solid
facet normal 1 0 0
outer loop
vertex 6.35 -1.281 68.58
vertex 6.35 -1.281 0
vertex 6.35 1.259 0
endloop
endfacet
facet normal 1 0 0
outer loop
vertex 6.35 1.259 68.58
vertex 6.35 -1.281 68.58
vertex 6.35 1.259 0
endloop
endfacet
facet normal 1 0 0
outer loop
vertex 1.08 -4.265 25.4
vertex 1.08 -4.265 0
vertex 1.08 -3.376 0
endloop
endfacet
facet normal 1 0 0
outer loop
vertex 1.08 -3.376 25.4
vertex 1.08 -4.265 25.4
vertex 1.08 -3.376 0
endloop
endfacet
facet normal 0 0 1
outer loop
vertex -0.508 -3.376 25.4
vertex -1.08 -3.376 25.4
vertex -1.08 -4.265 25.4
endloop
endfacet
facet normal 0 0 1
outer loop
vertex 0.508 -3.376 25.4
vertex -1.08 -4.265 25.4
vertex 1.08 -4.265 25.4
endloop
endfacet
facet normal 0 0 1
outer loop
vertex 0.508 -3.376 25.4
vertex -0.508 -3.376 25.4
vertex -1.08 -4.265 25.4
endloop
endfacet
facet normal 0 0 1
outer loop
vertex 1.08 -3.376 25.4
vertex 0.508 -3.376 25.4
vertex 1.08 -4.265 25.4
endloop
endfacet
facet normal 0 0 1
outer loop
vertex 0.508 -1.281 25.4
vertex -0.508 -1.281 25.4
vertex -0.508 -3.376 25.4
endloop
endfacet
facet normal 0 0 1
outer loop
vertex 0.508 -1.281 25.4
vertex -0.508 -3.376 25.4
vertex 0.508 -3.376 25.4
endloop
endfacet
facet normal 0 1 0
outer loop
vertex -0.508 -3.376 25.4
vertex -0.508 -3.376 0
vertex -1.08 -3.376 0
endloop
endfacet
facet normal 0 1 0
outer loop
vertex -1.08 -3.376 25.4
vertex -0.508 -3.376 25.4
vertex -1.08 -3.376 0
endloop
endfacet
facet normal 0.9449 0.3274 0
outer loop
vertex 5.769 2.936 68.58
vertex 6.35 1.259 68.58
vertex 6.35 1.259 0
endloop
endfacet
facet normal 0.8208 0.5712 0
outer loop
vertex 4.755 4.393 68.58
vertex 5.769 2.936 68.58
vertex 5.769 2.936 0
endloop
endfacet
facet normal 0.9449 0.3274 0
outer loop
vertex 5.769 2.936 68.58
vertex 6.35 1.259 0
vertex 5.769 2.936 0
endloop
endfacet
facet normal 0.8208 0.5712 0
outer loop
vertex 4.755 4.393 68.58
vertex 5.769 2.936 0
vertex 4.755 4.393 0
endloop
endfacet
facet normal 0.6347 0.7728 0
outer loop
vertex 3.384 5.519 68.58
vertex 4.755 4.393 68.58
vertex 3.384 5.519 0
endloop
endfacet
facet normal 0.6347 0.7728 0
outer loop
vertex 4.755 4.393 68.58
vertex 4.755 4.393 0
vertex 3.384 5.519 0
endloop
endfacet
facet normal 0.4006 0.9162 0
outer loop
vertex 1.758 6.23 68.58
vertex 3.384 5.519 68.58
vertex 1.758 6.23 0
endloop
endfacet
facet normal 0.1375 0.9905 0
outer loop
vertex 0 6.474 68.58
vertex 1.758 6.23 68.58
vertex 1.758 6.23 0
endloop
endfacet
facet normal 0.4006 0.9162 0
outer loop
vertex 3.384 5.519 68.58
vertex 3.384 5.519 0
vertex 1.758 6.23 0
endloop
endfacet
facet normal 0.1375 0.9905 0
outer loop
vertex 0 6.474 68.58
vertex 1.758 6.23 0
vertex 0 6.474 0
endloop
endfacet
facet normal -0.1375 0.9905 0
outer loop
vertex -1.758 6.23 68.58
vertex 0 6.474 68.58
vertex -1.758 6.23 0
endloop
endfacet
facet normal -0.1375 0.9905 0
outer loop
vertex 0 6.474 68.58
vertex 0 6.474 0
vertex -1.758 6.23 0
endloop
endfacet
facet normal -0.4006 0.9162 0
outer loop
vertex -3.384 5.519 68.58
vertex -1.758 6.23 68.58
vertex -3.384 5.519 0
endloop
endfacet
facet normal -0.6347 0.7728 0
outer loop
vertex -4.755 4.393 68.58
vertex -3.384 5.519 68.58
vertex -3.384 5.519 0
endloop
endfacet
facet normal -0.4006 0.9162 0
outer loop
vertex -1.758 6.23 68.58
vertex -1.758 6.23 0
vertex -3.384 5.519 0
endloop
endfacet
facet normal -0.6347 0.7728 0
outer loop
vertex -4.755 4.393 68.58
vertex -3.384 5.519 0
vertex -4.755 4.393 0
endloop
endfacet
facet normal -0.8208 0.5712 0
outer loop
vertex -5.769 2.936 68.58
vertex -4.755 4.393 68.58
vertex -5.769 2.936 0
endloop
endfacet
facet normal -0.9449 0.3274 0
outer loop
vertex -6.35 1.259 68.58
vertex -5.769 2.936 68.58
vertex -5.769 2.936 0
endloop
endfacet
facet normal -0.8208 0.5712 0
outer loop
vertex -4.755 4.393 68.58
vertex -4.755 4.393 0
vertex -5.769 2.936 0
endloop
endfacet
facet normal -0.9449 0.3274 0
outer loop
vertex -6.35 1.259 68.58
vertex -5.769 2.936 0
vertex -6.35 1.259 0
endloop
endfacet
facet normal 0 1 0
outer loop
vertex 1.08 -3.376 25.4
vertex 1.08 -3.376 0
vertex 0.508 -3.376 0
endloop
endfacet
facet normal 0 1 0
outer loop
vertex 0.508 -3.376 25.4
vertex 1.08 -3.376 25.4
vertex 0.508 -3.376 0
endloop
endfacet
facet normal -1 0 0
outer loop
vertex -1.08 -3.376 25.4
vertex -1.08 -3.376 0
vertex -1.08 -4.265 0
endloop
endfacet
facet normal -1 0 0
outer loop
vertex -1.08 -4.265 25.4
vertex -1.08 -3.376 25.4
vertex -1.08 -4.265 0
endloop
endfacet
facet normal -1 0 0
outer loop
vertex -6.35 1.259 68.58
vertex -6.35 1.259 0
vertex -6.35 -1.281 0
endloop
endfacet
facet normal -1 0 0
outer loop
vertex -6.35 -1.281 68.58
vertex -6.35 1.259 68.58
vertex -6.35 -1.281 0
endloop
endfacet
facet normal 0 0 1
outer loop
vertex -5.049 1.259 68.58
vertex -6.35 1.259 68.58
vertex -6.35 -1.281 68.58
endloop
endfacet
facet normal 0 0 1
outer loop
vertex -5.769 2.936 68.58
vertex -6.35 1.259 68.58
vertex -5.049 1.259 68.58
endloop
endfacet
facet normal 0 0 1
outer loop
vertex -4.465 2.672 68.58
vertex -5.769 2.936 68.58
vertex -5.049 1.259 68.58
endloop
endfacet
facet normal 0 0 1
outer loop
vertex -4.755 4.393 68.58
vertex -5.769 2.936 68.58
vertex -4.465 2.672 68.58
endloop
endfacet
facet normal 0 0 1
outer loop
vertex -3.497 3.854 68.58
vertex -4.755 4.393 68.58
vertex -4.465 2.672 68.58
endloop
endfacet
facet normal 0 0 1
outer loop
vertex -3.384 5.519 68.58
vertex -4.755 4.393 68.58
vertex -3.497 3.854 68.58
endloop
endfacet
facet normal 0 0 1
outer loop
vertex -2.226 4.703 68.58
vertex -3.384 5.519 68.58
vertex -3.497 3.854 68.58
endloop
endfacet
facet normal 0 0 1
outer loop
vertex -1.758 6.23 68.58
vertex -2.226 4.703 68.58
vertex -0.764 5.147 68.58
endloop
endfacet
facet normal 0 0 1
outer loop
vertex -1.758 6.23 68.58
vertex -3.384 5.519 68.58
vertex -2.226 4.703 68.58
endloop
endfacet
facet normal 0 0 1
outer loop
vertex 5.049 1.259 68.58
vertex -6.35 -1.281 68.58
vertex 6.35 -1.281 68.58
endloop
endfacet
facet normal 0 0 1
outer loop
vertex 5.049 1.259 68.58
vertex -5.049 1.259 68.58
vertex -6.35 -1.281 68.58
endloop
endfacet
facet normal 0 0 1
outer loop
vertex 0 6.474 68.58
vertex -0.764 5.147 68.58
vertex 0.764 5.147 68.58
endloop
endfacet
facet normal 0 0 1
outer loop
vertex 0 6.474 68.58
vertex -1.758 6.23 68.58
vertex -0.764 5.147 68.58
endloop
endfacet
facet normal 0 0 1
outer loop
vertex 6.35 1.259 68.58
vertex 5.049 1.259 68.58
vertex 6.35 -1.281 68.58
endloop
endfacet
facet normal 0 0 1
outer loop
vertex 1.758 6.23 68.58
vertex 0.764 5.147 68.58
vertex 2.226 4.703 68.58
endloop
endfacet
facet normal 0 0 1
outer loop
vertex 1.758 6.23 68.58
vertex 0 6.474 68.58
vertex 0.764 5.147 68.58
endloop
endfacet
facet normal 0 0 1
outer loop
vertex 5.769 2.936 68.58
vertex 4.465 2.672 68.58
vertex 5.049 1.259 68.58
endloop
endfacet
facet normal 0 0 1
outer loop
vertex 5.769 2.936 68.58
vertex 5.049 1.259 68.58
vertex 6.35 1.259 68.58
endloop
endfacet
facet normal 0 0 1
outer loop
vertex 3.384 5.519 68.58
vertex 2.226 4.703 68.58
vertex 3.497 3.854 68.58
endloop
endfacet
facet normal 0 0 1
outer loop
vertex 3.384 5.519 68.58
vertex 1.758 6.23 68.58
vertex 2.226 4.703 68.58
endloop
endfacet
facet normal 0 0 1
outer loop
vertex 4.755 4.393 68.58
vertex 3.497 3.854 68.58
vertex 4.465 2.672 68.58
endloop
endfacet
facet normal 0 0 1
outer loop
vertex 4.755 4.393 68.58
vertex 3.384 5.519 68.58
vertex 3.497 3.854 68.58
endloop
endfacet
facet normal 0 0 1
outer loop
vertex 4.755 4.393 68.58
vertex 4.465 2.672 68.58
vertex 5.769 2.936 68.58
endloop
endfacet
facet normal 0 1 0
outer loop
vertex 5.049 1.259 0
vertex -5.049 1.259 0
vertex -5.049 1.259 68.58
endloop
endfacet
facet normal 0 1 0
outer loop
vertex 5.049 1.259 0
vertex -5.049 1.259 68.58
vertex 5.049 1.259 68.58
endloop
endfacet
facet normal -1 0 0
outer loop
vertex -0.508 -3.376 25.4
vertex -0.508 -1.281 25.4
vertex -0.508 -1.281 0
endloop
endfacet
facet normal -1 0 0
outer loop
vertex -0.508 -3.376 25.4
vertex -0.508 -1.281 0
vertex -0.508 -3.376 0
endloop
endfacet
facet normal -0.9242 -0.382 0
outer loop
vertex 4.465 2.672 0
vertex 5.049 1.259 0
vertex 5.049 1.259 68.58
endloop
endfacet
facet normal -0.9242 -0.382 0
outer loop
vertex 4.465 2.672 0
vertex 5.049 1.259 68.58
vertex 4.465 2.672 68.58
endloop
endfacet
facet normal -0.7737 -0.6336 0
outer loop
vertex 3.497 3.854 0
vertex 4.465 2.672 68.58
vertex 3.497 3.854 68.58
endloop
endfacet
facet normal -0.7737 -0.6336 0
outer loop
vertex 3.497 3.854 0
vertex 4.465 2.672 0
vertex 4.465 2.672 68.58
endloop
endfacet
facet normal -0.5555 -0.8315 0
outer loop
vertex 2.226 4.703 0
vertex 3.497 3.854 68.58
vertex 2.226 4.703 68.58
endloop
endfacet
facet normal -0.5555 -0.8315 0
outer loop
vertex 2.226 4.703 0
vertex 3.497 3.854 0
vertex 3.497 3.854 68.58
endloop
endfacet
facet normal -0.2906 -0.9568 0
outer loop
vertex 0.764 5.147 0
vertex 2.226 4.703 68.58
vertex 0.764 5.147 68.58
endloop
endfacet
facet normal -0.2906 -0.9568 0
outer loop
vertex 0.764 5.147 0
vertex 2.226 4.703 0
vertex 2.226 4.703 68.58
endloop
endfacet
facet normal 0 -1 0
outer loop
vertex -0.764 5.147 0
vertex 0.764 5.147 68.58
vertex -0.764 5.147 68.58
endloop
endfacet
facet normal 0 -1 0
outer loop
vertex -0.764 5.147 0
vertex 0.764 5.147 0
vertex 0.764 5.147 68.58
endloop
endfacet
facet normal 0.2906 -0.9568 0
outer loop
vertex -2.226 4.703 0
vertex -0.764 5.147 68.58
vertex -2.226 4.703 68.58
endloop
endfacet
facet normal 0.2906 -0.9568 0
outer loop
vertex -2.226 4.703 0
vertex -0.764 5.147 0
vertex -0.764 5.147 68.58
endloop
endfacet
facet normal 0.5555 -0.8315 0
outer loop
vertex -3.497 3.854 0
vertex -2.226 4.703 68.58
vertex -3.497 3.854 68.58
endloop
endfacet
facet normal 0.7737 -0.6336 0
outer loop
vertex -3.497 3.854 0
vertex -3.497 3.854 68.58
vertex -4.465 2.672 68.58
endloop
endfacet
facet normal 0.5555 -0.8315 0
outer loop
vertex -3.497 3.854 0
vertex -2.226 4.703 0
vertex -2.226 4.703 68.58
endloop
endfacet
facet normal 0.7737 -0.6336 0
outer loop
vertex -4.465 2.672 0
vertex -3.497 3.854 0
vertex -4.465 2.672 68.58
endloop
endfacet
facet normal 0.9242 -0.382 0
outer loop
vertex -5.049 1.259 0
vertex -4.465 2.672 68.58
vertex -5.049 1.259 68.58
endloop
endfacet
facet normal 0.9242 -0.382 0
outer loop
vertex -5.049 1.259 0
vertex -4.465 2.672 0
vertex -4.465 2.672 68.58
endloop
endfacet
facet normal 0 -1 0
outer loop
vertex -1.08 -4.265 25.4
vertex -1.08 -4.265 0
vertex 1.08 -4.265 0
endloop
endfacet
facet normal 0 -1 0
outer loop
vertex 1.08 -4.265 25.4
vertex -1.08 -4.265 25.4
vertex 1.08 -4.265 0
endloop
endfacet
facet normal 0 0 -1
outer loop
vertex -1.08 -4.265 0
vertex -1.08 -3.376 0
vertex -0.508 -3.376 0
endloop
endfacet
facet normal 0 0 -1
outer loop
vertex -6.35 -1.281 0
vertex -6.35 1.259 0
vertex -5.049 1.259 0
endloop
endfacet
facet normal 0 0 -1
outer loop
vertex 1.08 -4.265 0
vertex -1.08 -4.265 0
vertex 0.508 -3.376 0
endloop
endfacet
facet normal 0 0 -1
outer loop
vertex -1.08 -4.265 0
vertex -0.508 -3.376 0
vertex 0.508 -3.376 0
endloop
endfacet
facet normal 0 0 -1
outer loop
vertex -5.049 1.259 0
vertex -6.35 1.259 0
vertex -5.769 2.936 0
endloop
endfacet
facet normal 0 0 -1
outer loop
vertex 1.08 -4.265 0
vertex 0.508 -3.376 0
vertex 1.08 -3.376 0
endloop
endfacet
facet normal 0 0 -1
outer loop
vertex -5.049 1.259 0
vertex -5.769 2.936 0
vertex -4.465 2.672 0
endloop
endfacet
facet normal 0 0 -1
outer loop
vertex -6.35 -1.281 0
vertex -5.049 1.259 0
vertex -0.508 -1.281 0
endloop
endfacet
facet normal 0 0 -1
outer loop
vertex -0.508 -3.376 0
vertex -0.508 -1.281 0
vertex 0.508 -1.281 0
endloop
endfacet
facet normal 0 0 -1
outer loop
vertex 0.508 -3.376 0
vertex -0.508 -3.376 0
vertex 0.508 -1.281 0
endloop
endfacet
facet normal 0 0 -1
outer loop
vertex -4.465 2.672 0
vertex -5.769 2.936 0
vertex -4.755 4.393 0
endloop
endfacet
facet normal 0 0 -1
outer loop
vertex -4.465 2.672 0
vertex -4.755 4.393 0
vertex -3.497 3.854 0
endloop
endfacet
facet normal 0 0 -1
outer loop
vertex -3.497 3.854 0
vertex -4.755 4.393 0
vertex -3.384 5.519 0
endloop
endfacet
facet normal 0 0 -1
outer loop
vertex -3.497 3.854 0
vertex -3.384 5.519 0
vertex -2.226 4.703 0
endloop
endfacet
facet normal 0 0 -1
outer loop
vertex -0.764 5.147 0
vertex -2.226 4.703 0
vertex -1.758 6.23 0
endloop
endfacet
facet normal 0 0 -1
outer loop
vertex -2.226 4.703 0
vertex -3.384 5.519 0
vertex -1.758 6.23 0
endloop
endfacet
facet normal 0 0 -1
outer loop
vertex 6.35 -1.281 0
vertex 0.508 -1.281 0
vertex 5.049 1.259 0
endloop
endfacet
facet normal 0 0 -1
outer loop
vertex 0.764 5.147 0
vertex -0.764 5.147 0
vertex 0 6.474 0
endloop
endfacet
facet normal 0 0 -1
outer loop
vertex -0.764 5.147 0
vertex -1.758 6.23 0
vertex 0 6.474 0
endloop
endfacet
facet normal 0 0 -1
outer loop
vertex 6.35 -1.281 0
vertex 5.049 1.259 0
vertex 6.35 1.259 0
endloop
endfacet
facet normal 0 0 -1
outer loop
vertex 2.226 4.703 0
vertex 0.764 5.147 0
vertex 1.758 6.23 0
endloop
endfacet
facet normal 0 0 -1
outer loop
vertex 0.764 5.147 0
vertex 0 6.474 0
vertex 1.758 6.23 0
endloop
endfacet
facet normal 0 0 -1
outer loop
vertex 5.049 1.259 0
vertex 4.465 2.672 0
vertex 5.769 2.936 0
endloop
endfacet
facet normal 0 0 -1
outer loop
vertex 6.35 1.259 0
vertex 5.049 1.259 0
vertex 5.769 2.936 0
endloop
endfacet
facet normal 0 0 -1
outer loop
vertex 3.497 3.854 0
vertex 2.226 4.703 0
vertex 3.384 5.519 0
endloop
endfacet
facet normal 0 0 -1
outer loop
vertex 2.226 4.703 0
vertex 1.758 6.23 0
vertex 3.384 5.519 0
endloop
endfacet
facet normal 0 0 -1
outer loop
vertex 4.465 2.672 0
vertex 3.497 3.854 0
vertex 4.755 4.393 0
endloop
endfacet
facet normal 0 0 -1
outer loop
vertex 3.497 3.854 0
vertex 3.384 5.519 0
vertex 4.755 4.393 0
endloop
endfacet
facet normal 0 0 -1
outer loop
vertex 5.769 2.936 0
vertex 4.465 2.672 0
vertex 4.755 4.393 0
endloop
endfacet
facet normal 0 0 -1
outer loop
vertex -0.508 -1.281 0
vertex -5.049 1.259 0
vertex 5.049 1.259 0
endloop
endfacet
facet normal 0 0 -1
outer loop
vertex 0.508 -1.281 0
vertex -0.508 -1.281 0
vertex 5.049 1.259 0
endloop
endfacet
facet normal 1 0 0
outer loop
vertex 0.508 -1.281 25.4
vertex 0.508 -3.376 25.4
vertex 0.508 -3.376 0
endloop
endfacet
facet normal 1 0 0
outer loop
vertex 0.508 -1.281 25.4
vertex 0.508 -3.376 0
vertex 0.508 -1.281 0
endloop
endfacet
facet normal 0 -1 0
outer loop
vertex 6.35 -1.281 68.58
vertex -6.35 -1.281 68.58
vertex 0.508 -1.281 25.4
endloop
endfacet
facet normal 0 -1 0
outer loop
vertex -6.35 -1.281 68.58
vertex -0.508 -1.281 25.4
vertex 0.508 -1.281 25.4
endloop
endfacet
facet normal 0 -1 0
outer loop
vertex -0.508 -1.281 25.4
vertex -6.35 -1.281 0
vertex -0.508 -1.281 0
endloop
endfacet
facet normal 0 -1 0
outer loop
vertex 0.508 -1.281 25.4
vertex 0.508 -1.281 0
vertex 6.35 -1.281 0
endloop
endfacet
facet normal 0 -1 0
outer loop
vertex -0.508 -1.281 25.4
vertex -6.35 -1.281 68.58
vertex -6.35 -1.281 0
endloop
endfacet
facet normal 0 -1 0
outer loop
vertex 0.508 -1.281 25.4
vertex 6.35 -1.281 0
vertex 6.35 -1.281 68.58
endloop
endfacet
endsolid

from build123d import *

# Parameters (mm, degrees)
BOSS_EXTRUDE1_DEPTH = 68.58
BOSS_EXTRUDE2_DEPTH = 25.4


with BuildPart() as part:
    # Sketch1 → Boss-Extrude1 (new body)
    with BuildSketch(Plane.XY):
        with BuildLine():
            Line((-6.35, 1.25906277), (-6.35, -1.28093723))
            Line((-6.35, -1.28093723), (6.35, -1.28093723))
            Line((6.35, -1.28093723), (6.35, 1.25906277))
            ThreePointArc((6.35, 1.25906277), (0, 6.473618699), (-6.35, 1.25906277))
        make_face()
        with BuildLine():
            Line((-5.049000743, 1.25906277), (5.049000743, 1.25906277))
            ThreePointArc((5.049000743, 1.25906277), (0, 5.203618699), (-5.049000743, 1.25906277))
        make_face(mode=Mode.SUBTRACT)
    extrude(amount=BOSS_EXTRUDE1_DEPTH)

    # Sketch3 → Boss-Extrude2 (add)
    with BuildSketch(Plane(origin=(0, 0, 0), x_dir=(-1, 0, 0), z_dir=(0, 0, -1))):
        Polygon((0.508, -1.28093723), (0.508, -3.37643723), (1.0795, -3.37643723), (1.0795, -4.26543723), (-1.0795, -4.26543723), (-1.0795, -3.37643723), (-0.508, -3.37643723), (-0.508, -1.28093723), align=None)
    extrude(amount=-BOSS_EXTRUDE2_DEPTH)


solid = part.part
